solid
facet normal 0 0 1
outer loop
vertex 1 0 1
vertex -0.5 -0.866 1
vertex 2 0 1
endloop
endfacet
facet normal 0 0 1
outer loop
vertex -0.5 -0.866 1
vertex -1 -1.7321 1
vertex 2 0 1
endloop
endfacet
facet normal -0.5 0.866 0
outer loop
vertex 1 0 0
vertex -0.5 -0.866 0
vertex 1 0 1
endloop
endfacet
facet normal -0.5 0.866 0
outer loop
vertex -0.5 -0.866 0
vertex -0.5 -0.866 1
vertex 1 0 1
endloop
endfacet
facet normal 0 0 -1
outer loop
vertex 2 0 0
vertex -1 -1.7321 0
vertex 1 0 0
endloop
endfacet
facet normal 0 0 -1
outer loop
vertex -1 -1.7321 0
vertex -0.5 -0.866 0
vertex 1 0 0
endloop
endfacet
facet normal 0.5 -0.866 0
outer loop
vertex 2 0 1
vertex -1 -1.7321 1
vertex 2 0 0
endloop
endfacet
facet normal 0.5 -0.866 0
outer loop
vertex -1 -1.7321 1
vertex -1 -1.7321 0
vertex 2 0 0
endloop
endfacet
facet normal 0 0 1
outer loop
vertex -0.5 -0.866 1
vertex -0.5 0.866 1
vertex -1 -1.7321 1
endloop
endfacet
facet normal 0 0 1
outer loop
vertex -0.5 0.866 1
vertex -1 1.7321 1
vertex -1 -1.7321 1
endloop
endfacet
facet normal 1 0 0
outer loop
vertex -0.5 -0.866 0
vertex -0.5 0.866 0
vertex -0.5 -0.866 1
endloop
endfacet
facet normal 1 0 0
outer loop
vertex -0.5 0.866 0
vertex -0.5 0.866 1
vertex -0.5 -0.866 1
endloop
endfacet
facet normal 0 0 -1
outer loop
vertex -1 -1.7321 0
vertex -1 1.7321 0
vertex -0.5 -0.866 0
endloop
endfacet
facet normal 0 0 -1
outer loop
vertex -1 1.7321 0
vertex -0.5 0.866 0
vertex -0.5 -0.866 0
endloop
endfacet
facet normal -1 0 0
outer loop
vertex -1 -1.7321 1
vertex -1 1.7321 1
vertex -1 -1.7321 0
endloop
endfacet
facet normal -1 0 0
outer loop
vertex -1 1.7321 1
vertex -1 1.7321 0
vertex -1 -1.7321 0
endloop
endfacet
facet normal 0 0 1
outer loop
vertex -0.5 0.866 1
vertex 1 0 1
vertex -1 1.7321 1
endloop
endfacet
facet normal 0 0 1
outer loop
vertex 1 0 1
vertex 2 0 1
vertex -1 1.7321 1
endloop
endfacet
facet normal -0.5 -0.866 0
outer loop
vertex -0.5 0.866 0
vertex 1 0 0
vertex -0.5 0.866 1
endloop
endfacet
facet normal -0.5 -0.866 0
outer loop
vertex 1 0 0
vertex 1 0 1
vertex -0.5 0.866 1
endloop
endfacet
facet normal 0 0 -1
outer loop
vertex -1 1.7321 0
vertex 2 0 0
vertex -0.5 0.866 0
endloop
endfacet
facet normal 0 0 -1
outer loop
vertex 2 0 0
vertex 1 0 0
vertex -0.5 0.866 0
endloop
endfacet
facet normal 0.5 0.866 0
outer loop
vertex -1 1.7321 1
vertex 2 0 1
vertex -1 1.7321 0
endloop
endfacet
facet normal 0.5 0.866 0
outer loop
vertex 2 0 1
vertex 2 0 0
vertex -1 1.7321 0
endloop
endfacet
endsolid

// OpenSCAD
rotate_extrude(angle=1080, $fn=3) translate([-2,0]) square([1,1]);
